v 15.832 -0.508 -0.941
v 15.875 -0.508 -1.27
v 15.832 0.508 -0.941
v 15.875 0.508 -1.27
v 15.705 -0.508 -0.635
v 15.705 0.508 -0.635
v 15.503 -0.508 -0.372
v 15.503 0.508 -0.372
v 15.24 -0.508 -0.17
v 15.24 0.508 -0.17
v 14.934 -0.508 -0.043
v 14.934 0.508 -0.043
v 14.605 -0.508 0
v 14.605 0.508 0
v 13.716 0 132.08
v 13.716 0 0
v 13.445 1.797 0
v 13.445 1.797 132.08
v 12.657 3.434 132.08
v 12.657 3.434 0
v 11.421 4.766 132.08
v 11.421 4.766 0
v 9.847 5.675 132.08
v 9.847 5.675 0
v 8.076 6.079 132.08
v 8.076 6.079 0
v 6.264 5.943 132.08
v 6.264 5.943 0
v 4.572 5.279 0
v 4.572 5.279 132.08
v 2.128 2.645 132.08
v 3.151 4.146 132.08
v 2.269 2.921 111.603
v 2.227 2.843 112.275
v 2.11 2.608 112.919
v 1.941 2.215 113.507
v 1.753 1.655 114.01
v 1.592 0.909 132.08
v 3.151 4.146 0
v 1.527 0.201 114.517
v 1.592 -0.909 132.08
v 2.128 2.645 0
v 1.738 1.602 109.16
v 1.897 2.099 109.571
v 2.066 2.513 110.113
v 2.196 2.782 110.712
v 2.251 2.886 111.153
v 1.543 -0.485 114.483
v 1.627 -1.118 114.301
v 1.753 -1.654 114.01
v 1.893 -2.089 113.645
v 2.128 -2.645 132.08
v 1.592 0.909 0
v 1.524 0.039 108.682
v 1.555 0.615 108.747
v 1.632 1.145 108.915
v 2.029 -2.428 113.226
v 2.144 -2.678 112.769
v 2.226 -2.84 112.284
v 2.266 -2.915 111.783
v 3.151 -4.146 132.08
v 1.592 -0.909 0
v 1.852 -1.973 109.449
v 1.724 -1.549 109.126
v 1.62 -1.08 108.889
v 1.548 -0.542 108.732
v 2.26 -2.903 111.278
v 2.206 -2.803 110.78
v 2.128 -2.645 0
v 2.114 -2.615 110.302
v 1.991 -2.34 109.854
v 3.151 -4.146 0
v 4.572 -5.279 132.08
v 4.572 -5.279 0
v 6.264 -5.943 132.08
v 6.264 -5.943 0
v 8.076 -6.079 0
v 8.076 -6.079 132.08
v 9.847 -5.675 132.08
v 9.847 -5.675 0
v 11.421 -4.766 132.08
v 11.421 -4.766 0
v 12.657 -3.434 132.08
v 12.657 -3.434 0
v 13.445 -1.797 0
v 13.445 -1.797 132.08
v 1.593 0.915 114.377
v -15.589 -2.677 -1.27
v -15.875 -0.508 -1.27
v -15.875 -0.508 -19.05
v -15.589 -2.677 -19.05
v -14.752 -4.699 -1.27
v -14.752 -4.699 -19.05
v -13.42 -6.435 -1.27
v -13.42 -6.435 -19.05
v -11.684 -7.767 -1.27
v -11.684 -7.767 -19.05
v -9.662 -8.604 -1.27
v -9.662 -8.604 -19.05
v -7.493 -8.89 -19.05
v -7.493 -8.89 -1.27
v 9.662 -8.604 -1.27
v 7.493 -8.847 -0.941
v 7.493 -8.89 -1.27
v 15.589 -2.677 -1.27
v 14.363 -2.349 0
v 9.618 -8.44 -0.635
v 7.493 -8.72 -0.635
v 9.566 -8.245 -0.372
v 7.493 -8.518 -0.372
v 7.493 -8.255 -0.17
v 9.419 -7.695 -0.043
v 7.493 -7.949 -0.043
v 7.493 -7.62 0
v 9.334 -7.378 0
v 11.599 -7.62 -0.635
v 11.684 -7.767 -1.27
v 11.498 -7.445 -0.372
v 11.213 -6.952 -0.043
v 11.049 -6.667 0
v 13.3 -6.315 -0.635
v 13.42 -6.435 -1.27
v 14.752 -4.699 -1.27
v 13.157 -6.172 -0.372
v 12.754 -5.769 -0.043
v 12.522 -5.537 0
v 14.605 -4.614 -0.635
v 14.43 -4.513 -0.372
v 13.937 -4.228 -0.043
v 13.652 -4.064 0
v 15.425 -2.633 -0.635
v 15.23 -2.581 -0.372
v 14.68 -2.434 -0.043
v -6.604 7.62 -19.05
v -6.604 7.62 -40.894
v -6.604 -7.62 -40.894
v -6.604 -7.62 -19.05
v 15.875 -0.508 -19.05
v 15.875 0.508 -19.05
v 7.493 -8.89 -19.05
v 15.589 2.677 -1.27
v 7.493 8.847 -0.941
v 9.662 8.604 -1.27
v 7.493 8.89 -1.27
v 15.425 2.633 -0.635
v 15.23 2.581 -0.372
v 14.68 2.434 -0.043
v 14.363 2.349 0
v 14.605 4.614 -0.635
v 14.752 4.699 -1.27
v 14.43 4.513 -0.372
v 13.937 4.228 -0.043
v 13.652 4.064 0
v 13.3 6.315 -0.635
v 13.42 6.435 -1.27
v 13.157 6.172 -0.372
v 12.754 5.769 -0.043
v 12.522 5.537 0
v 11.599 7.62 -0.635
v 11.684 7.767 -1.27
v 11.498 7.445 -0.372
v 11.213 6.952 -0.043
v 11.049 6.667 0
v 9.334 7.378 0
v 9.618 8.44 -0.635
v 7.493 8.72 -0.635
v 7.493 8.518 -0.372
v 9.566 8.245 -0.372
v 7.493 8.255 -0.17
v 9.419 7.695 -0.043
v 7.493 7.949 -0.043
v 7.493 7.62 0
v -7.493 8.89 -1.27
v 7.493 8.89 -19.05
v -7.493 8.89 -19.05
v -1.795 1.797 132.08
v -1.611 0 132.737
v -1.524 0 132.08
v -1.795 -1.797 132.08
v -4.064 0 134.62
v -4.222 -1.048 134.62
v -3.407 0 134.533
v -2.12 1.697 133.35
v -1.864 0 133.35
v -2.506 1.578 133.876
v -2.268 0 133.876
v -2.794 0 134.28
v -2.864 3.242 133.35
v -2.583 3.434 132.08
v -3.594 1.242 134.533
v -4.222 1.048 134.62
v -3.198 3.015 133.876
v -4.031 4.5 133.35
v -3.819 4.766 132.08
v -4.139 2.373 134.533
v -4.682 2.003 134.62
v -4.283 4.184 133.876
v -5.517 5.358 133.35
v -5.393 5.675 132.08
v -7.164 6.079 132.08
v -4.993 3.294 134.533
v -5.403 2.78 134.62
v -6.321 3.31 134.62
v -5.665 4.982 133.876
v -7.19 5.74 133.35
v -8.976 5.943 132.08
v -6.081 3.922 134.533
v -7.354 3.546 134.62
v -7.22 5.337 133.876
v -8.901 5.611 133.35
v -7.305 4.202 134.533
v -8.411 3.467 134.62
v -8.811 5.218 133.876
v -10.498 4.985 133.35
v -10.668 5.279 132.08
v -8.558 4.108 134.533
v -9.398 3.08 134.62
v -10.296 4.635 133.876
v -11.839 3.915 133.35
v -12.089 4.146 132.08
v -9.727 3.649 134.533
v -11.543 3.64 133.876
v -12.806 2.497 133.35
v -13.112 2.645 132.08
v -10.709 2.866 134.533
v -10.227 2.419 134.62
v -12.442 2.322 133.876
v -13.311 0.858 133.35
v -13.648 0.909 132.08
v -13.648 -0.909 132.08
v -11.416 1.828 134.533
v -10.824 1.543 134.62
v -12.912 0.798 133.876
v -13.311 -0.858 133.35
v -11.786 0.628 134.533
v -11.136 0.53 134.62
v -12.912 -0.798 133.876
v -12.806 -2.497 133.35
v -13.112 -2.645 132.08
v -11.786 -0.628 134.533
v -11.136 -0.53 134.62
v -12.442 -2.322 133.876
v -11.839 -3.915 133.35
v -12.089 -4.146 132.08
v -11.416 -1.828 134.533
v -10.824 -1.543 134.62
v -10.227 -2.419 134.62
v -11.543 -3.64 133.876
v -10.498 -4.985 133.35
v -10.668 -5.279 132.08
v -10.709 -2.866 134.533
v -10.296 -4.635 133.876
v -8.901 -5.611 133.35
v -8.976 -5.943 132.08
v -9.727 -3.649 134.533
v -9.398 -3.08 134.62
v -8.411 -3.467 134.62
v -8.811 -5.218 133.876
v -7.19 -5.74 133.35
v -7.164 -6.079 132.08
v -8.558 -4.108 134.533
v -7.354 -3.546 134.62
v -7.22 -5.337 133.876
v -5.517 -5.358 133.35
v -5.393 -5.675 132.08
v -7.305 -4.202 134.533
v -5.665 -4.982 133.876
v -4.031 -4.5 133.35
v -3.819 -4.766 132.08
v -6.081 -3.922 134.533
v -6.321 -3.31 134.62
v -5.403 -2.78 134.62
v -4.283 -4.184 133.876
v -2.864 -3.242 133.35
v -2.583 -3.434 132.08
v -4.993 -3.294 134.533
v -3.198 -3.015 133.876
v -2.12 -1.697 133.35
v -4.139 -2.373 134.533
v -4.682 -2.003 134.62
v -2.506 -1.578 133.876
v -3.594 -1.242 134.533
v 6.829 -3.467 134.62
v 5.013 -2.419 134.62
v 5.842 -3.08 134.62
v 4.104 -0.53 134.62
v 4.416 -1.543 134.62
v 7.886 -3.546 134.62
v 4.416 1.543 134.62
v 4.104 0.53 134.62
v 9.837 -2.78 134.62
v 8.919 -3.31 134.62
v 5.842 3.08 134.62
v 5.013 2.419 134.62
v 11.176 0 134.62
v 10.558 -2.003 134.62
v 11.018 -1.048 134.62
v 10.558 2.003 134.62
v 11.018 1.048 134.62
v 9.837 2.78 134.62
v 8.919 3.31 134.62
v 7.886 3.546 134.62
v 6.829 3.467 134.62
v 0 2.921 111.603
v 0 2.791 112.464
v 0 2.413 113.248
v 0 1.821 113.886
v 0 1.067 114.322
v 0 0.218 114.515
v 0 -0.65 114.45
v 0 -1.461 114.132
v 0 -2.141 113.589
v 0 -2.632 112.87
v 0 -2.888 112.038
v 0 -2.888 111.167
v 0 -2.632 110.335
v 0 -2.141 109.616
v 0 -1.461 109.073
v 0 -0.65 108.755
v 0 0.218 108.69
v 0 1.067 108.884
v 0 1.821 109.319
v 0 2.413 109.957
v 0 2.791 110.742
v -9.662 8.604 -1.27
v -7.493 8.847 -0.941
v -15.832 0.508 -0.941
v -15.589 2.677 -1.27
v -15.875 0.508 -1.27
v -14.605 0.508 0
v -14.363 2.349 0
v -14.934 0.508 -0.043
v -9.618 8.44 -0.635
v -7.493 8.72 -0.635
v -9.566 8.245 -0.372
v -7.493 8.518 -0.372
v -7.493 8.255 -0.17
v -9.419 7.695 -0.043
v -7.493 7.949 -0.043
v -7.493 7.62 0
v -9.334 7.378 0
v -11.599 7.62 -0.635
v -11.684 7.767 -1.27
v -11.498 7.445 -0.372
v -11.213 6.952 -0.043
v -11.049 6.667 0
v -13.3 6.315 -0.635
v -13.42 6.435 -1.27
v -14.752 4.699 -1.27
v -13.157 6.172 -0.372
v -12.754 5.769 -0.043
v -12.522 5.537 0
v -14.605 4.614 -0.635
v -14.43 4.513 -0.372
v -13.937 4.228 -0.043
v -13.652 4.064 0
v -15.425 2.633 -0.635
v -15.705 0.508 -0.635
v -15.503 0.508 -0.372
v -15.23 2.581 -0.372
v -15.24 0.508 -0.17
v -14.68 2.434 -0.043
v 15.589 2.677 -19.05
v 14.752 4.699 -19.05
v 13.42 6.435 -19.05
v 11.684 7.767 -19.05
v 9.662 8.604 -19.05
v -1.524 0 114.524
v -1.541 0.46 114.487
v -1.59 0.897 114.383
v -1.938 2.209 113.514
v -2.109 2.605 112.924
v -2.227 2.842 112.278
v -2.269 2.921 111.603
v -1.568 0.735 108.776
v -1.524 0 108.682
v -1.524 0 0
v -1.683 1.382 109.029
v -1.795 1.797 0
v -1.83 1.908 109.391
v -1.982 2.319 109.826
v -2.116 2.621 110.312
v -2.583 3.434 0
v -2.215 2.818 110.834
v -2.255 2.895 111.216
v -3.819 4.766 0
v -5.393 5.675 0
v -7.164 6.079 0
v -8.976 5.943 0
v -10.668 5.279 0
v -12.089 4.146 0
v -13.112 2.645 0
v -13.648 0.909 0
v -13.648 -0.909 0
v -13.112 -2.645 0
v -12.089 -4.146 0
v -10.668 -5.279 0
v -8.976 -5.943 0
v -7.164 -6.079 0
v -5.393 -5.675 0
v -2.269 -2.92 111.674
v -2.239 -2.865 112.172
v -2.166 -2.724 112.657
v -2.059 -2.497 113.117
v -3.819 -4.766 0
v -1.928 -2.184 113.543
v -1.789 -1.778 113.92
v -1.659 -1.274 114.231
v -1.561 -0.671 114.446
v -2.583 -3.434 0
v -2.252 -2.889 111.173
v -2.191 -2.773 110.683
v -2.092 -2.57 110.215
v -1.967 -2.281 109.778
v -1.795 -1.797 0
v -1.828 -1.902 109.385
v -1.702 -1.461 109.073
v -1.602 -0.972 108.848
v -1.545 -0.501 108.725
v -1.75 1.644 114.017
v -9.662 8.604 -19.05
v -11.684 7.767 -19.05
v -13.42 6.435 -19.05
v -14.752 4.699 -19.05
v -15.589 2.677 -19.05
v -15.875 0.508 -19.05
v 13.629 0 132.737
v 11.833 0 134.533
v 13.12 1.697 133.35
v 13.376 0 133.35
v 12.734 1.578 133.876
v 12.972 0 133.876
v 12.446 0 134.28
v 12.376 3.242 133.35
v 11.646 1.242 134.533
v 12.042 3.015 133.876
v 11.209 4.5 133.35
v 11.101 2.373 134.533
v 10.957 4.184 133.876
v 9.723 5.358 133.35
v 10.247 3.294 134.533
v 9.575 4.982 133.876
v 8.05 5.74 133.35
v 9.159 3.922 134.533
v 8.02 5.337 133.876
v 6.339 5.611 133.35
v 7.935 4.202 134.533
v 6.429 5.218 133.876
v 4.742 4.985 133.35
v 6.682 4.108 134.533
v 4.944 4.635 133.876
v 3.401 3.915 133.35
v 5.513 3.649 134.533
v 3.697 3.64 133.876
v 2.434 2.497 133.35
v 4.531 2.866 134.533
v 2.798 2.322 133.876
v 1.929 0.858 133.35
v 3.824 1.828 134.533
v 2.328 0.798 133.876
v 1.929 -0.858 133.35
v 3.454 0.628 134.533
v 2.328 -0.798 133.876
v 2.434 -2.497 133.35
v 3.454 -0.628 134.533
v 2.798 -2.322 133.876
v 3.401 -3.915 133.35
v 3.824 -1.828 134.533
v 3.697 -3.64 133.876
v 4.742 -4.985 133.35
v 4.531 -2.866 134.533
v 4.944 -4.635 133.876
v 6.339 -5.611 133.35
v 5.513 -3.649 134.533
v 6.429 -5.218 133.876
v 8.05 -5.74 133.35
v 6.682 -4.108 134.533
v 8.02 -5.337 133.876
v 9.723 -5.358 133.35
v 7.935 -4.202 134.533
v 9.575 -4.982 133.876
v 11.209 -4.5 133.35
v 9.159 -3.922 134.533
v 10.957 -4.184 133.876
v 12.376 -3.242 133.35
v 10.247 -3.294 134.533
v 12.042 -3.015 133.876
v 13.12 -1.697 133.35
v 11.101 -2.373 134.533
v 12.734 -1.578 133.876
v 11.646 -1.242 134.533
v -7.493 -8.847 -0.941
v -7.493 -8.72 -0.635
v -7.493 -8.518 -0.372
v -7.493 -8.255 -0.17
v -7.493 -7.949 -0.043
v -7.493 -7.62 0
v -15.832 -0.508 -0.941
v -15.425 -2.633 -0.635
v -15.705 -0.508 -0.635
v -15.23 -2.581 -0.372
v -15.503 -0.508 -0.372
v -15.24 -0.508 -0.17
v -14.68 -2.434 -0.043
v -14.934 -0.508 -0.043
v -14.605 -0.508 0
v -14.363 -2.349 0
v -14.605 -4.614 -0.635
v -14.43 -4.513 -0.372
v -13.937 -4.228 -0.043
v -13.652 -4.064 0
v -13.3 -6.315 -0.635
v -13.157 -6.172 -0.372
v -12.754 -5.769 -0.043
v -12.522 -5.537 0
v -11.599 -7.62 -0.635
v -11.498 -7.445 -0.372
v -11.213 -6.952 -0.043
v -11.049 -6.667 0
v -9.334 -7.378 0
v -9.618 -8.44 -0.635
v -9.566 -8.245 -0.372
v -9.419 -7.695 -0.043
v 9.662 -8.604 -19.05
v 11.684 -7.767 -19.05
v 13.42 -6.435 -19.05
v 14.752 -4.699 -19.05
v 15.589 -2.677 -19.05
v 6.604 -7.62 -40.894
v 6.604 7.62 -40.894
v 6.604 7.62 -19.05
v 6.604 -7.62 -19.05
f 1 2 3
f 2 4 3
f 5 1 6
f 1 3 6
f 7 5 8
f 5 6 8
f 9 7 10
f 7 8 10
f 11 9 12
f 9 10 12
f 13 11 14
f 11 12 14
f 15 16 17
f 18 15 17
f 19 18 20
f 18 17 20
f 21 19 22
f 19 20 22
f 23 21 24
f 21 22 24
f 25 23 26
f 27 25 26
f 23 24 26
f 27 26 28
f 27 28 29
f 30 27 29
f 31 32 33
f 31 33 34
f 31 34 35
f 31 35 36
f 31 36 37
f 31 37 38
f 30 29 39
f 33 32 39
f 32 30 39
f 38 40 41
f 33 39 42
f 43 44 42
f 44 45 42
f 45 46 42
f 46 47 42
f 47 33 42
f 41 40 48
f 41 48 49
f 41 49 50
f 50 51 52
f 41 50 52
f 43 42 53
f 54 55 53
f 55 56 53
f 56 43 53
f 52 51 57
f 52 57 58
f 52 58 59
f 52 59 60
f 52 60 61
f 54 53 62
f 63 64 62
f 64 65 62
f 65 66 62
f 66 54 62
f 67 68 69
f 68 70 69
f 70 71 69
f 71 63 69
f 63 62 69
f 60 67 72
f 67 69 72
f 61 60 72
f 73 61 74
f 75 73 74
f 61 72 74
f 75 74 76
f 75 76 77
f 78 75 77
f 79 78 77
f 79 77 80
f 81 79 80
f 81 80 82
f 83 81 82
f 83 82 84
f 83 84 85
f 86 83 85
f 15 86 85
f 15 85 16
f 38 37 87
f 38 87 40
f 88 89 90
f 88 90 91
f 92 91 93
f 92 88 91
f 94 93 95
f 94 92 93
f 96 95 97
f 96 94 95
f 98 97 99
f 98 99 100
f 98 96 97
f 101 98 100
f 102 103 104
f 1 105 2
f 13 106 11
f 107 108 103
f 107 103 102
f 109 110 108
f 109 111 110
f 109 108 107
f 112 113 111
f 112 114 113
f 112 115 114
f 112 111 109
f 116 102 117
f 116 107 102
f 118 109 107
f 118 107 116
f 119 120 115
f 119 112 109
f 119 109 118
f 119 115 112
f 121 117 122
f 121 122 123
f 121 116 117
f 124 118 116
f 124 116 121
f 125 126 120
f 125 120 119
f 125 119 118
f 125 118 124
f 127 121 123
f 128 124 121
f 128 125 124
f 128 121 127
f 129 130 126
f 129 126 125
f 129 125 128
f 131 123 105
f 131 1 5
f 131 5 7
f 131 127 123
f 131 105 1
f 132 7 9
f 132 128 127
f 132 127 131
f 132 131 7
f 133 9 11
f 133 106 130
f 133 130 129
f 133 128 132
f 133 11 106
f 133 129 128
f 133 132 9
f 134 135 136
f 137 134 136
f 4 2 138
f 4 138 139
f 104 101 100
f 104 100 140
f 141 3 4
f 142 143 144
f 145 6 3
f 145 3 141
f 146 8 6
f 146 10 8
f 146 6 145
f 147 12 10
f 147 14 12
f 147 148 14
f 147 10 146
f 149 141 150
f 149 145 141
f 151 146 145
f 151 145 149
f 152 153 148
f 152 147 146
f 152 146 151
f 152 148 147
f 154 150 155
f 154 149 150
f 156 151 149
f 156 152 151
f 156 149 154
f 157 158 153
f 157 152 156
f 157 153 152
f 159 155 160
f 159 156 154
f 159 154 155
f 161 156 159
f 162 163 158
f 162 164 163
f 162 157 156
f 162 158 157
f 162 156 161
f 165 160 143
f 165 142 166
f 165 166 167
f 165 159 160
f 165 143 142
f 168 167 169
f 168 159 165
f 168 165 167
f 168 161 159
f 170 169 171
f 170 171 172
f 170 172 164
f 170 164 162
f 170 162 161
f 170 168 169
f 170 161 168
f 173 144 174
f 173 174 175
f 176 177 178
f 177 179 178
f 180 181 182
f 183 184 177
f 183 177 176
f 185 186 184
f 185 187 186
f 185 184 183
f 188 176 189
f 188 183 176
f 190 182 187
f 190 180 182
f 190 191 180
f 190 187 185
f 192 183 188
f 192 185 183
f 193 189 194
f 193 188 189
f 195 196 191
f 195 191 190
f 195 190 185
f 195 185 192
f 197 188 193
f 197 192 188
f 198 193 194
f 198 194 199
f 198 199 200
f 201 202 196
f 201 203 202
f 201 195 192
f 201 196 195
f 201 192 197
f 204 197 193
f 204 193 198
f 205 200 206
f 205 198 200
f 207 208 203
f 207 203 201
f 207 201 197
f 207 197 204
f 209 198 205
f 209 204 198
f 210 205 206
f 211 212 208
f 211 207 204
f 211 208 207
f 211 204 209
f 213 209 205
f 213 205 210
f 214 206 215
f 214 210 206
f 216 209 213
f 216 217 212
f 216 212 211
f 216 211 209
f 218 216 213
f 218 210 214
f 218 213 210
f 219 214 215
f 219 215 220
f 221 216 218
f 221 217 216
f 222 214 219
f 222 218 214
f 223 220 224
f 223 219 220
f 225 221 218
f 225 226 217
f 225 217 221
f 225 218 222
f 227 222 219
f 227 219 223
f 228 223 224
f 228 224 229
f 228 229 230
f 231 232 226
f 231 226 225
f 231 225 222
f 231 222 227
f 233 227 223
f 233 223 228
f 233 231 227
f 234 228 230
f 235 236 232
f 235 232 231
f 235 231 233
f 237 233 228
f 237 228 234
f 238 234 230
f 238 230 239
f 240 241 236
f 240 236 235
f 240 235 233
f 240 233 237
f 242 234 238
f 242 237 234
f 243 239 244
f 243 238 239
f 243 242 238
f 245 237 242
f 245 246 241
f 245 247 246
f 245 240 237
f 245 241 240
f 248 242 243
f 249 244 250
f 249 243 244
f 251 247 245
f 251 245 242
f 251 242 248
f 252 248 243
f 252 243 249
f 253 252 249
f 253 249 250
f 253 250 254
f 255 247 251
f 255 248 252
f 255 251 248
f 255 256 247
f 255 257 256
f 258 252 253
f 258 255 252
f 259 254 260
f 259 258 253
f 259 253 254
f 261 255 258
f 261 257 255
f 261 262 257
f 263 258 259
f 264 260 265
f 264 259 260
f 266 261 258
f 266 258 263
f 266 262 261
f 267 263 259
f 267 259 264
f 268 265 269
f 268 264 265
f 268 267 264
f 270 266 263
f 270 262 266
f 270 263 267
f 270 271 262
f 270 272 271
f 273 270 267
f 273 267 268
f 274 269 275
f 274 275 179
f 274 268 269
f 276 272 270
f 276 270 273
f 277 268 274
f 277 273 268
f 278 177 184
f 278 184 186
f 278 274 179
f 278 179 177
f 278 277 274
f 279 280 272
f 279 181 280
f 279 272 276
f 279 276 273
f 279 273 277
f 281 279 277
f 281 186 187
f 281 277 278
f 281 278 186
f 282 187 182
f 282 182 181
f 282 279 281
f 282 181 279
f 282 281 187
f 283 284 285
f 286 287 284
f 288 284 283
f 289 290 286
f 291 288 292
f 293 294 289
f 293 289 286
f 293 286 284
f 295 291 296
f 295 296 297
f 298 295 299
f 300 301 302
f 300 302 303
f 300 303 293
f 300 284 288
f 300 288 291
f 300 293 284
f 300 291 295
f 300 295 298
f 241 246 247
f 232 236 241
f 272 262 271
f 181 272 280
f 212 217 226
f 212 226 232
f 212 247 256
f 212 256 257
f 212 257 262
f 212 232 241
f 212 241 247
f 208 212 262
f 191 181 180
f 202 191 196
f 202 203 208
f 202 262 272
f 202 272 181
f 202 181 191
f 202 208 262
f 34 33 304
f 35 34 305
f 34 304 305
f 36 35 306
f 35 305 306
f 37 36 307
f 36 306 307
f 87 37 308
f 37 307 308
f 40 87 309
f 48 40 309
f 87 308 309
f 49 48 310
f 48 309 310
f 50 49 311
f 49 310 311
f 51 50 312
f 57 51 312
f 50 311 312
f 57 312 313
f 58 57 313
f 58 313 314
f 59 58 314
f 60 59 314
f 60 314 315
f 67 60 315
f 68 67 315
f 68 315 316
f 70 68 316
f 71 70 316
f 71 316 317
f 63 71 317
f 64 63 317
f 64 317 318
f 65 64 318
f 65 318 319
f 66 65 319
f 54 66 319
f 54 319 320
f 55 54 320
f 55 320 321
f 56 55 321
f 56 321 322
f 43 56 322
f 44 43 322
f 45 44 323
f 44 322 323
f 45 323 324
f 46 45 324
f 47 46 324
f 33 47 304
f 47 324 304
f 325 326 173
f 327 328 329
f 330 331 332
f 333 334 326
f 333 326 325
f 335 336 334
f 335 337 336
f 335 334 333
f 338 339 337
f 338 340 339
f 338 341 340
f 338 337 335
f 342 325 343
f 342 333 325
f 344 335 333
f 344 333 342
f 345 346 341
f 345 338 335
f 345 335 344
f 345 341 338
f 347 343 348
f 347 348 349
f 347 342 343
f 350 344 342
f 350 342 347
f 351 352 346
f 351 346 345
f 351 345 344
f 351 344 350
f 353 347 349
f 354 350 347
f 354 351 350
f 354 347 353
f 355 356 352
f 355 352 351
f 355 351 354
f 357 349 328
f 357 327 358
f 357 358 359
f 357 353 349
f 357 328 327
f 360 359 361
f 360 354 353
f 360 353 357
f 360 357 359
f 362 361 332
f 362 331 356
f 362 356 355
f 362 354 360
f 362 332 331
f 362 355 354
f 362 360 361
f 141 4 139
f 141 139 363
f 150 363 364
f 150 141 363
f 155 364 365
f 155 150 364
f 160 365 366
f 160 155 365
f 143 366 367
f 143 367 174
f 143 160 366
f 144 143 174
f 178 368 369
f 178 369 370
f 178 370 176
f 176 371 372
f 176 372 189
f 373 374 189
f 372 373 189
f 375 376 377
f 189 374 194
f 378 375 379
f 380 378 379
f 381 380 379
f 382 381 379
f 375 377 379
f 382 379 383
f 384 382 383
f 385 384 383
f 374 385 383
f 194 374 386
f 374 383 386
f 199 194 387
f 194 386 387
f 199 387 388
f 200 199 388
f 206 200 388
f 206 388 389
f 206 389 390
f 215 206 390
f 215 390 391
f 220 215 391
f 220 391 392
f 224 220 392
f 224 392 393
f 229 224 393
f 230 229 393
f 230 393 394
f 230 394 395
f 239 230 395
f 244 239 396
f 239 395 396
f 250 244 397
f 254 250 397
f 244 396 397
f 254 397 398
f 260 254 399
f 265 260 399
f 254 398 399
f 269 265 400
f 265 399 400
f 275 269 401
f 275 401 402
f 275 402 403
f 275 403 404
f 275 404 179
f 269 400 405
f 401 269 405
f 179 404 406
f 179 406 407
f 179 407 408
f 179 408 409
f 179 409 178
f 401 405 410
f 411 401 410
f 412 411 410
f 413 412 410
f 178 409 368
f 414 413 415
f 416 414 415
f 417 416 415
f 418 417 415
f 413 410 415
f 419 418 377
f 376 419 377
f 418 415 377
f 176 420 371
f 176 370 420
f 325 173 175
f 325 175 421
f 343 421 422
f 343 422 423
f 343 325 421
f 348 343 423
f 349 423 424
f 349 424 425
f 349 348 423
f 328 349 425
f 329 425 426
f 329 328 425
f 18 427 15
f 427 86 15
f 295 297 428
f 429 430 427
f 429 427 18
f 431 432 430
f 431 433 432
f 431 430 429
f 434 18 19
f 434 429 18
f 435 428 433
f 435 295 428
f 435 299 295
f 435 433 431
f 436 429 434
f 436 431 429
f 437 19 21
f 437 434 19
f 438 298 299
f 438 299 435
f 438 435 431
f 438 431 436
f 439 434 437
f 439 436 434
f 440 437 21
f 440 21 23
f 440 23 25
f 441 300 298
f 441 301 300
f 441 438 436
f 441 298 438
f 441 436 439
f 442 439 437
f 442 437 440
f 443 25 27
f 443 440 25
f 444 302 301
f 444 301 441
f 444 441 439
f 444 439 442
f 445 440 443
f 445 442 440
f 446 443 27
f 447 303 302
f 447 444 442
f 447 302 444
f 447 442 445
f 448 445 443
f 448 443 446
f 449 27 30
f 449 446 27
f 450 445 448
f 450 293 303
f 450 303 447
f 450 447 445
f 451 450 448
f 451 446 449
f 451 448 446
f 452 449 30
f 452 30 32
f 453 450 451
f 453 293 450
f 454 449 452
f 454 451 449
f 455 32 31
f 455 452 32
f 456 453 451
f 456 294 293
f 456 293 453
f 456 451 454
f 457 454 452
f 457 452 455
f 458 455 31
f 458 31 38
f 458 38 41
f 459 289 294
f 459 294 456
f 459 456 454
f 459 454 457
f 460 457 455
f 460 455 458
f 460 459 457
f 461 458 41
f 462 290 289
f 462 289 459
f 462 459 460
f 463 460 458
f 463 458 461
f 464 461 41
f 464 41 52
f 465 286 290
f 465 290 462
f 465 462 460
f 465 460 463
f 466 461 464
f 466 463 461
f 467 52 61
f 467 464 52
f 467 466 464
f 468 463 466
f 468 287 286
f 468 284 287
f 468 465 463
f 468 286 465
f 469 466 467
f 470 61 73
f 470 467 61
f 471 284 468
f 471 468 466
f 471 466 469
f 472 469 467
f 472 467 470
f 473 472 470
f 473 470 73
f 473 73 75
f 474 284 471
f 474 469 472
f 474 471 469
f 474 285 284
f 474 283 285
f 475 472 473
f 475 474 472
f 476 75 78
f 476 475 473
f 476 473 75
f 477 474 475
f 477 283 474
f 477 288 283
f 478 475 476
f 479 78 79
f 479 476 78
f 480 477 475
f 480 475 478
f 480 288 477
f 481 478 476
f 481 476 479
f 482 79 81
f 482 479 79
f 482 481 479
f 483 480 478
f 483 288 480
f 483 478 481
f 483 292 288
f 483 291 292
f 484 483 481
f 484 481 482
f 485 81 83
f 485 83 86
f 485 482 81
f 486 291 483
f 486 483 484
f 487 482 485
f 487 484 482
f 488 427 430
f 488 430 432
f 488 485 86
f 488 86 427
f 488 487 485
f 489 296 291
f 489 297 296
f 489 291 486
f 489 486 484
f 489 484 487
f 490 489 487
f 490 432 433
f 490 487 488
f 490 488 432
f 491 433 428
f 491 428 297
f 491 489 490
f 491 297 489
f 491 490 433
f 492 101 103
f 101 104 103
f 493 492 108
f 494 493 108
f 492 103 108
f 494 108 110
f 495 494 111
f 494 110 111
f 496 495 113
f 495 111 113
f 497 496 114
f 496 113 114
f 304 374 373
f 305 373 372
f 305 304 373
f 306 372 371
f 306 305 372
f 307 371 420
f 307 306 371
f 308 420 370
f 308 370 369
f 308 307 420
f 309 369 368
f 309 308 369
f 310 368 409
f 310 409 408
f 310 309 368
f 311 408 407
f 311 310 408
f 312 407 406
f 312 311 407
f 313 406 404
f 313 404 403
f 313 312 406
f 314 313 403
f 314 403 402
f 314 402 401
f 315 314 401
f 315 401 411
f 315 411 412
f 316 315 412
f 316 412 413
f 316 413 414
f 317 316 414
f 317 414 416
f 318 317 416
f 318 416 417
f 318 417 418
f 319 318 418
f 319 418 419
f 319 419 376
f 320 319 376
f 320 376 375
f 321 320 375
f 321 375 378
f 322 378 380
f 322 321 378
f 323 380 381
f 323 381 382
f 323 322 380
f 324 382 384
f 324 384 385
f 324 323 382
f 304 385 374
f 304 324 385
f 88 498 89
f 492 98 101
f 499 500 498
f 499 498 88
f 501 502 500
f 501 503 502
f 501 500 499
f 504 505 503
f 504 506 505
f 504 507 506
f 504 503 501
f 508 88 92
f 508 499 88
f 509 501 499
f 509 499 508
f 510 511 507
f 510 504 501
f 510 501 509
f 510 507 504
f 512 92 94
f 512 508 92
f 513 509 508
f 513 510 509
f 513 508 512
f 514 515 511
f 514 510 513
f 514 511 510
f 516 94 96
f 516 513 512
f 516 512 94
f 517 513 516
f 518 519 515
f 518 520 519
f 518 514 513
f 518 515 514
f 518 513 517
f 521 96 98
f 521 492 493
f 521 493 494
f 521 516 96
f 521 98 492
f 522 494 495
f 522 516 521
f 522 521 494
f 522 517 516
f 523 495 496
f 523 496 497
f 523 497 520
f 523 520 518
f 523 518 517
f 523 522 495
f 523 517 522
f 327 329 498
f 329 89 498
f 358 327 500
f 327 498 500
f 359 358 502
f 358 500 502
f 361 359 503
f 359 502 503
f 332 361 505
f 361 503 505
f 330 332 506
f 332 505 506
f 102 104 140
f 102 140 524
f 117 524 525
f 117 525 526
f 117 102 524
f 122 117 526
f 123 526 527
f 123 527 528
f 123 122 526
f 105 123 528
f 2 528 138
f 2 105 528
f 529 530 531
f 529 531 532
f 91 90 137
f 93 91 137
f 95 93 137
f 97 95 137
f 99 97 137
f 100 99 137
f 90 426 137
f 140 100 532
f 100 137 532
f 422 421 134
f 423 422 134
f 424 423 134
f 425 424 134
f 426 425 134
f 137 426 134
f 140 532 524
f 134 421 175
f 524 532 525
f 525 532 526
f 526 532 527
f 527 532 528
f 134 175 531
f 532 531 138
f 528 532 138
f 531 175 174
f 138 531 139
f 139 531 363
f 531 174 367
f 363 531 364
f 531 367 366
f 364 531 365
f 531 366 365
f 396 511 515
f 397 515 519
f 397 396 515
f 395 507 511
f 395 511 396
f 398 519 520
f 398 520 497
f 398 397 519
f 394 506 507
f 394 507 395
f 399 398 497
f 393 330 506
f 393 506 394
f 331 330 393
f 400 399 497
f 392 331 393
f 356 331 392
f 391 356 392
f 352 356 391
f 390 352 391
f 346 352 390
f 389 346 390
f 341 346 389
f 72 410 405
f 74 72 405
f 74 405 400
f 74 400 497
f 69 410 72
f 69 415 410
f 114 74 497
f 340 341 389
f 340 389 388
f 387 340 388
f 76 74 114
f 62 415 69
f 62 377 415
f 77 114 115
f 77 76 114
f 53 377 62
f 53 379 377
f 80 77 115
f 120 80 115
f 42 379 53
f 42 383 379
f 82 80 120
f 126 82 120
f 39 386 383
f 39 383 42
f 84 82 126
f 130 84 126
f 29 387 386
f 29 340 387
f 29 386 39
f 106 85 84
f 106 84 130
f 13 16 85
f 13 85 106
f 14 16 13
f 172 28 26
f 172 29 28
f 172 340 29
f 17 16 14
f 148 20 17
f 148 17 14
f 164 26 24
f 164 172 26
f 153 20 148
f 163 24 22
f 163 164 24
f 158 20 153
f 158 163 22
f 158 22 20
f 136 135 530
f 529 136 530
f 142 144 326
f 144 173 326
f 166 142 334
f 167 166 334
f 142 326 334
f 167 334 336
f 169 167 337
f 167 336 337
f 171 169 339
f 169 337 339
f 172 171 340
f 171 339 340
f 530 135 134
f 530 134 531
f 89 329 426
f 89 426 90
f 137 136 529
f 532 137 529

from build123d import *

# Parameters (mm, degrees)
F0_R          = 6.096
F1_DEPTH      = 134.62
F2_R          = 2.921
F3_DEPTH      = 5.08
F3_DEPTH_BACK = 5.08
F4_R          = 2.54
F6_DEPTH      = 19.05
F7_R          = 1.27
F8_W          = 13.208
F8_H          = 15.24
F9_DEPTH      = 21.844


with BuildPart() as f1:
    # F0 (on Top) → F1 (new body)
    with BuildSketch(Plane.XY):
        with Locations((7.62, 0)):
            Circle(F0_R)
        with Locations((-7.62, 0)):
            Circle(F0_R)
    extrude(amount=F1_DEPTH)

    # F2 (on Right) → F3 (join, two sides)
    with BuildSketch(Plane.YZ) as f3_sk:
        with Locations((0, 111.602642)):
            Circle(F2_R)
    extrude(amount=F3_DEPTH)
    extrude(f3_sk.sketch, amount=-F3_DEPTH_BACK)

    # F4
    f4_edges = [f1.edges().sort_by_distance(p)[0] for p in [
        (-13.716, 0, 134.62),
        (1.524, 0, 134.62),
    ]]
    fillet(f4_edges, radius=F4_R)

    # F5 (on Top) → F6 (join)
    with BuildSketch(Plane.XY):
        with BuildLine():
            ThreePointArc((-15.875, -0.508), (-13.419969, -6.434969), (-7.493, -8.89))
            Line((-7.493, -8.89), (7.493, -8.89))
            ThreePointArc((7.493, -8.89), (13.419969, -6.434969), (15.875, -0.508))
            Line((15.875, -0.508), (15.875, 0.508))
            ThreePointArc((15.875, 0.508), (13.419969, 6.434969), (7.493, 8.89))
            Line((7.493, 8.89), (-7.493, 8.89))
            ThreePointArc((-7.493, 8.89), (-13.419969, 6.434969), (-15.875, 0.508))
            Line((-15.875, 0.508), (-15.875, -0.508))
        make_face()
    extrude(amount=-F6_DEPTH)

    # F7
    f7_edges = [f1.edges().sort_by_distance(p)[0] for p in [
        (0, -8.89, 0),
    ]]
    fillet(f7_edges, radius=F7_R)

    # F8 (on face) → F9 (join)
    with BuildSketch(Plane(origin=(0, 0, -19.05), x_dir=(1, 0, 0), z_dir=(0, 0, -1))):
        Rectangle(F8_W, F8_H)
    extrude(amount=F9_DEPTH)


solid = f1.part
